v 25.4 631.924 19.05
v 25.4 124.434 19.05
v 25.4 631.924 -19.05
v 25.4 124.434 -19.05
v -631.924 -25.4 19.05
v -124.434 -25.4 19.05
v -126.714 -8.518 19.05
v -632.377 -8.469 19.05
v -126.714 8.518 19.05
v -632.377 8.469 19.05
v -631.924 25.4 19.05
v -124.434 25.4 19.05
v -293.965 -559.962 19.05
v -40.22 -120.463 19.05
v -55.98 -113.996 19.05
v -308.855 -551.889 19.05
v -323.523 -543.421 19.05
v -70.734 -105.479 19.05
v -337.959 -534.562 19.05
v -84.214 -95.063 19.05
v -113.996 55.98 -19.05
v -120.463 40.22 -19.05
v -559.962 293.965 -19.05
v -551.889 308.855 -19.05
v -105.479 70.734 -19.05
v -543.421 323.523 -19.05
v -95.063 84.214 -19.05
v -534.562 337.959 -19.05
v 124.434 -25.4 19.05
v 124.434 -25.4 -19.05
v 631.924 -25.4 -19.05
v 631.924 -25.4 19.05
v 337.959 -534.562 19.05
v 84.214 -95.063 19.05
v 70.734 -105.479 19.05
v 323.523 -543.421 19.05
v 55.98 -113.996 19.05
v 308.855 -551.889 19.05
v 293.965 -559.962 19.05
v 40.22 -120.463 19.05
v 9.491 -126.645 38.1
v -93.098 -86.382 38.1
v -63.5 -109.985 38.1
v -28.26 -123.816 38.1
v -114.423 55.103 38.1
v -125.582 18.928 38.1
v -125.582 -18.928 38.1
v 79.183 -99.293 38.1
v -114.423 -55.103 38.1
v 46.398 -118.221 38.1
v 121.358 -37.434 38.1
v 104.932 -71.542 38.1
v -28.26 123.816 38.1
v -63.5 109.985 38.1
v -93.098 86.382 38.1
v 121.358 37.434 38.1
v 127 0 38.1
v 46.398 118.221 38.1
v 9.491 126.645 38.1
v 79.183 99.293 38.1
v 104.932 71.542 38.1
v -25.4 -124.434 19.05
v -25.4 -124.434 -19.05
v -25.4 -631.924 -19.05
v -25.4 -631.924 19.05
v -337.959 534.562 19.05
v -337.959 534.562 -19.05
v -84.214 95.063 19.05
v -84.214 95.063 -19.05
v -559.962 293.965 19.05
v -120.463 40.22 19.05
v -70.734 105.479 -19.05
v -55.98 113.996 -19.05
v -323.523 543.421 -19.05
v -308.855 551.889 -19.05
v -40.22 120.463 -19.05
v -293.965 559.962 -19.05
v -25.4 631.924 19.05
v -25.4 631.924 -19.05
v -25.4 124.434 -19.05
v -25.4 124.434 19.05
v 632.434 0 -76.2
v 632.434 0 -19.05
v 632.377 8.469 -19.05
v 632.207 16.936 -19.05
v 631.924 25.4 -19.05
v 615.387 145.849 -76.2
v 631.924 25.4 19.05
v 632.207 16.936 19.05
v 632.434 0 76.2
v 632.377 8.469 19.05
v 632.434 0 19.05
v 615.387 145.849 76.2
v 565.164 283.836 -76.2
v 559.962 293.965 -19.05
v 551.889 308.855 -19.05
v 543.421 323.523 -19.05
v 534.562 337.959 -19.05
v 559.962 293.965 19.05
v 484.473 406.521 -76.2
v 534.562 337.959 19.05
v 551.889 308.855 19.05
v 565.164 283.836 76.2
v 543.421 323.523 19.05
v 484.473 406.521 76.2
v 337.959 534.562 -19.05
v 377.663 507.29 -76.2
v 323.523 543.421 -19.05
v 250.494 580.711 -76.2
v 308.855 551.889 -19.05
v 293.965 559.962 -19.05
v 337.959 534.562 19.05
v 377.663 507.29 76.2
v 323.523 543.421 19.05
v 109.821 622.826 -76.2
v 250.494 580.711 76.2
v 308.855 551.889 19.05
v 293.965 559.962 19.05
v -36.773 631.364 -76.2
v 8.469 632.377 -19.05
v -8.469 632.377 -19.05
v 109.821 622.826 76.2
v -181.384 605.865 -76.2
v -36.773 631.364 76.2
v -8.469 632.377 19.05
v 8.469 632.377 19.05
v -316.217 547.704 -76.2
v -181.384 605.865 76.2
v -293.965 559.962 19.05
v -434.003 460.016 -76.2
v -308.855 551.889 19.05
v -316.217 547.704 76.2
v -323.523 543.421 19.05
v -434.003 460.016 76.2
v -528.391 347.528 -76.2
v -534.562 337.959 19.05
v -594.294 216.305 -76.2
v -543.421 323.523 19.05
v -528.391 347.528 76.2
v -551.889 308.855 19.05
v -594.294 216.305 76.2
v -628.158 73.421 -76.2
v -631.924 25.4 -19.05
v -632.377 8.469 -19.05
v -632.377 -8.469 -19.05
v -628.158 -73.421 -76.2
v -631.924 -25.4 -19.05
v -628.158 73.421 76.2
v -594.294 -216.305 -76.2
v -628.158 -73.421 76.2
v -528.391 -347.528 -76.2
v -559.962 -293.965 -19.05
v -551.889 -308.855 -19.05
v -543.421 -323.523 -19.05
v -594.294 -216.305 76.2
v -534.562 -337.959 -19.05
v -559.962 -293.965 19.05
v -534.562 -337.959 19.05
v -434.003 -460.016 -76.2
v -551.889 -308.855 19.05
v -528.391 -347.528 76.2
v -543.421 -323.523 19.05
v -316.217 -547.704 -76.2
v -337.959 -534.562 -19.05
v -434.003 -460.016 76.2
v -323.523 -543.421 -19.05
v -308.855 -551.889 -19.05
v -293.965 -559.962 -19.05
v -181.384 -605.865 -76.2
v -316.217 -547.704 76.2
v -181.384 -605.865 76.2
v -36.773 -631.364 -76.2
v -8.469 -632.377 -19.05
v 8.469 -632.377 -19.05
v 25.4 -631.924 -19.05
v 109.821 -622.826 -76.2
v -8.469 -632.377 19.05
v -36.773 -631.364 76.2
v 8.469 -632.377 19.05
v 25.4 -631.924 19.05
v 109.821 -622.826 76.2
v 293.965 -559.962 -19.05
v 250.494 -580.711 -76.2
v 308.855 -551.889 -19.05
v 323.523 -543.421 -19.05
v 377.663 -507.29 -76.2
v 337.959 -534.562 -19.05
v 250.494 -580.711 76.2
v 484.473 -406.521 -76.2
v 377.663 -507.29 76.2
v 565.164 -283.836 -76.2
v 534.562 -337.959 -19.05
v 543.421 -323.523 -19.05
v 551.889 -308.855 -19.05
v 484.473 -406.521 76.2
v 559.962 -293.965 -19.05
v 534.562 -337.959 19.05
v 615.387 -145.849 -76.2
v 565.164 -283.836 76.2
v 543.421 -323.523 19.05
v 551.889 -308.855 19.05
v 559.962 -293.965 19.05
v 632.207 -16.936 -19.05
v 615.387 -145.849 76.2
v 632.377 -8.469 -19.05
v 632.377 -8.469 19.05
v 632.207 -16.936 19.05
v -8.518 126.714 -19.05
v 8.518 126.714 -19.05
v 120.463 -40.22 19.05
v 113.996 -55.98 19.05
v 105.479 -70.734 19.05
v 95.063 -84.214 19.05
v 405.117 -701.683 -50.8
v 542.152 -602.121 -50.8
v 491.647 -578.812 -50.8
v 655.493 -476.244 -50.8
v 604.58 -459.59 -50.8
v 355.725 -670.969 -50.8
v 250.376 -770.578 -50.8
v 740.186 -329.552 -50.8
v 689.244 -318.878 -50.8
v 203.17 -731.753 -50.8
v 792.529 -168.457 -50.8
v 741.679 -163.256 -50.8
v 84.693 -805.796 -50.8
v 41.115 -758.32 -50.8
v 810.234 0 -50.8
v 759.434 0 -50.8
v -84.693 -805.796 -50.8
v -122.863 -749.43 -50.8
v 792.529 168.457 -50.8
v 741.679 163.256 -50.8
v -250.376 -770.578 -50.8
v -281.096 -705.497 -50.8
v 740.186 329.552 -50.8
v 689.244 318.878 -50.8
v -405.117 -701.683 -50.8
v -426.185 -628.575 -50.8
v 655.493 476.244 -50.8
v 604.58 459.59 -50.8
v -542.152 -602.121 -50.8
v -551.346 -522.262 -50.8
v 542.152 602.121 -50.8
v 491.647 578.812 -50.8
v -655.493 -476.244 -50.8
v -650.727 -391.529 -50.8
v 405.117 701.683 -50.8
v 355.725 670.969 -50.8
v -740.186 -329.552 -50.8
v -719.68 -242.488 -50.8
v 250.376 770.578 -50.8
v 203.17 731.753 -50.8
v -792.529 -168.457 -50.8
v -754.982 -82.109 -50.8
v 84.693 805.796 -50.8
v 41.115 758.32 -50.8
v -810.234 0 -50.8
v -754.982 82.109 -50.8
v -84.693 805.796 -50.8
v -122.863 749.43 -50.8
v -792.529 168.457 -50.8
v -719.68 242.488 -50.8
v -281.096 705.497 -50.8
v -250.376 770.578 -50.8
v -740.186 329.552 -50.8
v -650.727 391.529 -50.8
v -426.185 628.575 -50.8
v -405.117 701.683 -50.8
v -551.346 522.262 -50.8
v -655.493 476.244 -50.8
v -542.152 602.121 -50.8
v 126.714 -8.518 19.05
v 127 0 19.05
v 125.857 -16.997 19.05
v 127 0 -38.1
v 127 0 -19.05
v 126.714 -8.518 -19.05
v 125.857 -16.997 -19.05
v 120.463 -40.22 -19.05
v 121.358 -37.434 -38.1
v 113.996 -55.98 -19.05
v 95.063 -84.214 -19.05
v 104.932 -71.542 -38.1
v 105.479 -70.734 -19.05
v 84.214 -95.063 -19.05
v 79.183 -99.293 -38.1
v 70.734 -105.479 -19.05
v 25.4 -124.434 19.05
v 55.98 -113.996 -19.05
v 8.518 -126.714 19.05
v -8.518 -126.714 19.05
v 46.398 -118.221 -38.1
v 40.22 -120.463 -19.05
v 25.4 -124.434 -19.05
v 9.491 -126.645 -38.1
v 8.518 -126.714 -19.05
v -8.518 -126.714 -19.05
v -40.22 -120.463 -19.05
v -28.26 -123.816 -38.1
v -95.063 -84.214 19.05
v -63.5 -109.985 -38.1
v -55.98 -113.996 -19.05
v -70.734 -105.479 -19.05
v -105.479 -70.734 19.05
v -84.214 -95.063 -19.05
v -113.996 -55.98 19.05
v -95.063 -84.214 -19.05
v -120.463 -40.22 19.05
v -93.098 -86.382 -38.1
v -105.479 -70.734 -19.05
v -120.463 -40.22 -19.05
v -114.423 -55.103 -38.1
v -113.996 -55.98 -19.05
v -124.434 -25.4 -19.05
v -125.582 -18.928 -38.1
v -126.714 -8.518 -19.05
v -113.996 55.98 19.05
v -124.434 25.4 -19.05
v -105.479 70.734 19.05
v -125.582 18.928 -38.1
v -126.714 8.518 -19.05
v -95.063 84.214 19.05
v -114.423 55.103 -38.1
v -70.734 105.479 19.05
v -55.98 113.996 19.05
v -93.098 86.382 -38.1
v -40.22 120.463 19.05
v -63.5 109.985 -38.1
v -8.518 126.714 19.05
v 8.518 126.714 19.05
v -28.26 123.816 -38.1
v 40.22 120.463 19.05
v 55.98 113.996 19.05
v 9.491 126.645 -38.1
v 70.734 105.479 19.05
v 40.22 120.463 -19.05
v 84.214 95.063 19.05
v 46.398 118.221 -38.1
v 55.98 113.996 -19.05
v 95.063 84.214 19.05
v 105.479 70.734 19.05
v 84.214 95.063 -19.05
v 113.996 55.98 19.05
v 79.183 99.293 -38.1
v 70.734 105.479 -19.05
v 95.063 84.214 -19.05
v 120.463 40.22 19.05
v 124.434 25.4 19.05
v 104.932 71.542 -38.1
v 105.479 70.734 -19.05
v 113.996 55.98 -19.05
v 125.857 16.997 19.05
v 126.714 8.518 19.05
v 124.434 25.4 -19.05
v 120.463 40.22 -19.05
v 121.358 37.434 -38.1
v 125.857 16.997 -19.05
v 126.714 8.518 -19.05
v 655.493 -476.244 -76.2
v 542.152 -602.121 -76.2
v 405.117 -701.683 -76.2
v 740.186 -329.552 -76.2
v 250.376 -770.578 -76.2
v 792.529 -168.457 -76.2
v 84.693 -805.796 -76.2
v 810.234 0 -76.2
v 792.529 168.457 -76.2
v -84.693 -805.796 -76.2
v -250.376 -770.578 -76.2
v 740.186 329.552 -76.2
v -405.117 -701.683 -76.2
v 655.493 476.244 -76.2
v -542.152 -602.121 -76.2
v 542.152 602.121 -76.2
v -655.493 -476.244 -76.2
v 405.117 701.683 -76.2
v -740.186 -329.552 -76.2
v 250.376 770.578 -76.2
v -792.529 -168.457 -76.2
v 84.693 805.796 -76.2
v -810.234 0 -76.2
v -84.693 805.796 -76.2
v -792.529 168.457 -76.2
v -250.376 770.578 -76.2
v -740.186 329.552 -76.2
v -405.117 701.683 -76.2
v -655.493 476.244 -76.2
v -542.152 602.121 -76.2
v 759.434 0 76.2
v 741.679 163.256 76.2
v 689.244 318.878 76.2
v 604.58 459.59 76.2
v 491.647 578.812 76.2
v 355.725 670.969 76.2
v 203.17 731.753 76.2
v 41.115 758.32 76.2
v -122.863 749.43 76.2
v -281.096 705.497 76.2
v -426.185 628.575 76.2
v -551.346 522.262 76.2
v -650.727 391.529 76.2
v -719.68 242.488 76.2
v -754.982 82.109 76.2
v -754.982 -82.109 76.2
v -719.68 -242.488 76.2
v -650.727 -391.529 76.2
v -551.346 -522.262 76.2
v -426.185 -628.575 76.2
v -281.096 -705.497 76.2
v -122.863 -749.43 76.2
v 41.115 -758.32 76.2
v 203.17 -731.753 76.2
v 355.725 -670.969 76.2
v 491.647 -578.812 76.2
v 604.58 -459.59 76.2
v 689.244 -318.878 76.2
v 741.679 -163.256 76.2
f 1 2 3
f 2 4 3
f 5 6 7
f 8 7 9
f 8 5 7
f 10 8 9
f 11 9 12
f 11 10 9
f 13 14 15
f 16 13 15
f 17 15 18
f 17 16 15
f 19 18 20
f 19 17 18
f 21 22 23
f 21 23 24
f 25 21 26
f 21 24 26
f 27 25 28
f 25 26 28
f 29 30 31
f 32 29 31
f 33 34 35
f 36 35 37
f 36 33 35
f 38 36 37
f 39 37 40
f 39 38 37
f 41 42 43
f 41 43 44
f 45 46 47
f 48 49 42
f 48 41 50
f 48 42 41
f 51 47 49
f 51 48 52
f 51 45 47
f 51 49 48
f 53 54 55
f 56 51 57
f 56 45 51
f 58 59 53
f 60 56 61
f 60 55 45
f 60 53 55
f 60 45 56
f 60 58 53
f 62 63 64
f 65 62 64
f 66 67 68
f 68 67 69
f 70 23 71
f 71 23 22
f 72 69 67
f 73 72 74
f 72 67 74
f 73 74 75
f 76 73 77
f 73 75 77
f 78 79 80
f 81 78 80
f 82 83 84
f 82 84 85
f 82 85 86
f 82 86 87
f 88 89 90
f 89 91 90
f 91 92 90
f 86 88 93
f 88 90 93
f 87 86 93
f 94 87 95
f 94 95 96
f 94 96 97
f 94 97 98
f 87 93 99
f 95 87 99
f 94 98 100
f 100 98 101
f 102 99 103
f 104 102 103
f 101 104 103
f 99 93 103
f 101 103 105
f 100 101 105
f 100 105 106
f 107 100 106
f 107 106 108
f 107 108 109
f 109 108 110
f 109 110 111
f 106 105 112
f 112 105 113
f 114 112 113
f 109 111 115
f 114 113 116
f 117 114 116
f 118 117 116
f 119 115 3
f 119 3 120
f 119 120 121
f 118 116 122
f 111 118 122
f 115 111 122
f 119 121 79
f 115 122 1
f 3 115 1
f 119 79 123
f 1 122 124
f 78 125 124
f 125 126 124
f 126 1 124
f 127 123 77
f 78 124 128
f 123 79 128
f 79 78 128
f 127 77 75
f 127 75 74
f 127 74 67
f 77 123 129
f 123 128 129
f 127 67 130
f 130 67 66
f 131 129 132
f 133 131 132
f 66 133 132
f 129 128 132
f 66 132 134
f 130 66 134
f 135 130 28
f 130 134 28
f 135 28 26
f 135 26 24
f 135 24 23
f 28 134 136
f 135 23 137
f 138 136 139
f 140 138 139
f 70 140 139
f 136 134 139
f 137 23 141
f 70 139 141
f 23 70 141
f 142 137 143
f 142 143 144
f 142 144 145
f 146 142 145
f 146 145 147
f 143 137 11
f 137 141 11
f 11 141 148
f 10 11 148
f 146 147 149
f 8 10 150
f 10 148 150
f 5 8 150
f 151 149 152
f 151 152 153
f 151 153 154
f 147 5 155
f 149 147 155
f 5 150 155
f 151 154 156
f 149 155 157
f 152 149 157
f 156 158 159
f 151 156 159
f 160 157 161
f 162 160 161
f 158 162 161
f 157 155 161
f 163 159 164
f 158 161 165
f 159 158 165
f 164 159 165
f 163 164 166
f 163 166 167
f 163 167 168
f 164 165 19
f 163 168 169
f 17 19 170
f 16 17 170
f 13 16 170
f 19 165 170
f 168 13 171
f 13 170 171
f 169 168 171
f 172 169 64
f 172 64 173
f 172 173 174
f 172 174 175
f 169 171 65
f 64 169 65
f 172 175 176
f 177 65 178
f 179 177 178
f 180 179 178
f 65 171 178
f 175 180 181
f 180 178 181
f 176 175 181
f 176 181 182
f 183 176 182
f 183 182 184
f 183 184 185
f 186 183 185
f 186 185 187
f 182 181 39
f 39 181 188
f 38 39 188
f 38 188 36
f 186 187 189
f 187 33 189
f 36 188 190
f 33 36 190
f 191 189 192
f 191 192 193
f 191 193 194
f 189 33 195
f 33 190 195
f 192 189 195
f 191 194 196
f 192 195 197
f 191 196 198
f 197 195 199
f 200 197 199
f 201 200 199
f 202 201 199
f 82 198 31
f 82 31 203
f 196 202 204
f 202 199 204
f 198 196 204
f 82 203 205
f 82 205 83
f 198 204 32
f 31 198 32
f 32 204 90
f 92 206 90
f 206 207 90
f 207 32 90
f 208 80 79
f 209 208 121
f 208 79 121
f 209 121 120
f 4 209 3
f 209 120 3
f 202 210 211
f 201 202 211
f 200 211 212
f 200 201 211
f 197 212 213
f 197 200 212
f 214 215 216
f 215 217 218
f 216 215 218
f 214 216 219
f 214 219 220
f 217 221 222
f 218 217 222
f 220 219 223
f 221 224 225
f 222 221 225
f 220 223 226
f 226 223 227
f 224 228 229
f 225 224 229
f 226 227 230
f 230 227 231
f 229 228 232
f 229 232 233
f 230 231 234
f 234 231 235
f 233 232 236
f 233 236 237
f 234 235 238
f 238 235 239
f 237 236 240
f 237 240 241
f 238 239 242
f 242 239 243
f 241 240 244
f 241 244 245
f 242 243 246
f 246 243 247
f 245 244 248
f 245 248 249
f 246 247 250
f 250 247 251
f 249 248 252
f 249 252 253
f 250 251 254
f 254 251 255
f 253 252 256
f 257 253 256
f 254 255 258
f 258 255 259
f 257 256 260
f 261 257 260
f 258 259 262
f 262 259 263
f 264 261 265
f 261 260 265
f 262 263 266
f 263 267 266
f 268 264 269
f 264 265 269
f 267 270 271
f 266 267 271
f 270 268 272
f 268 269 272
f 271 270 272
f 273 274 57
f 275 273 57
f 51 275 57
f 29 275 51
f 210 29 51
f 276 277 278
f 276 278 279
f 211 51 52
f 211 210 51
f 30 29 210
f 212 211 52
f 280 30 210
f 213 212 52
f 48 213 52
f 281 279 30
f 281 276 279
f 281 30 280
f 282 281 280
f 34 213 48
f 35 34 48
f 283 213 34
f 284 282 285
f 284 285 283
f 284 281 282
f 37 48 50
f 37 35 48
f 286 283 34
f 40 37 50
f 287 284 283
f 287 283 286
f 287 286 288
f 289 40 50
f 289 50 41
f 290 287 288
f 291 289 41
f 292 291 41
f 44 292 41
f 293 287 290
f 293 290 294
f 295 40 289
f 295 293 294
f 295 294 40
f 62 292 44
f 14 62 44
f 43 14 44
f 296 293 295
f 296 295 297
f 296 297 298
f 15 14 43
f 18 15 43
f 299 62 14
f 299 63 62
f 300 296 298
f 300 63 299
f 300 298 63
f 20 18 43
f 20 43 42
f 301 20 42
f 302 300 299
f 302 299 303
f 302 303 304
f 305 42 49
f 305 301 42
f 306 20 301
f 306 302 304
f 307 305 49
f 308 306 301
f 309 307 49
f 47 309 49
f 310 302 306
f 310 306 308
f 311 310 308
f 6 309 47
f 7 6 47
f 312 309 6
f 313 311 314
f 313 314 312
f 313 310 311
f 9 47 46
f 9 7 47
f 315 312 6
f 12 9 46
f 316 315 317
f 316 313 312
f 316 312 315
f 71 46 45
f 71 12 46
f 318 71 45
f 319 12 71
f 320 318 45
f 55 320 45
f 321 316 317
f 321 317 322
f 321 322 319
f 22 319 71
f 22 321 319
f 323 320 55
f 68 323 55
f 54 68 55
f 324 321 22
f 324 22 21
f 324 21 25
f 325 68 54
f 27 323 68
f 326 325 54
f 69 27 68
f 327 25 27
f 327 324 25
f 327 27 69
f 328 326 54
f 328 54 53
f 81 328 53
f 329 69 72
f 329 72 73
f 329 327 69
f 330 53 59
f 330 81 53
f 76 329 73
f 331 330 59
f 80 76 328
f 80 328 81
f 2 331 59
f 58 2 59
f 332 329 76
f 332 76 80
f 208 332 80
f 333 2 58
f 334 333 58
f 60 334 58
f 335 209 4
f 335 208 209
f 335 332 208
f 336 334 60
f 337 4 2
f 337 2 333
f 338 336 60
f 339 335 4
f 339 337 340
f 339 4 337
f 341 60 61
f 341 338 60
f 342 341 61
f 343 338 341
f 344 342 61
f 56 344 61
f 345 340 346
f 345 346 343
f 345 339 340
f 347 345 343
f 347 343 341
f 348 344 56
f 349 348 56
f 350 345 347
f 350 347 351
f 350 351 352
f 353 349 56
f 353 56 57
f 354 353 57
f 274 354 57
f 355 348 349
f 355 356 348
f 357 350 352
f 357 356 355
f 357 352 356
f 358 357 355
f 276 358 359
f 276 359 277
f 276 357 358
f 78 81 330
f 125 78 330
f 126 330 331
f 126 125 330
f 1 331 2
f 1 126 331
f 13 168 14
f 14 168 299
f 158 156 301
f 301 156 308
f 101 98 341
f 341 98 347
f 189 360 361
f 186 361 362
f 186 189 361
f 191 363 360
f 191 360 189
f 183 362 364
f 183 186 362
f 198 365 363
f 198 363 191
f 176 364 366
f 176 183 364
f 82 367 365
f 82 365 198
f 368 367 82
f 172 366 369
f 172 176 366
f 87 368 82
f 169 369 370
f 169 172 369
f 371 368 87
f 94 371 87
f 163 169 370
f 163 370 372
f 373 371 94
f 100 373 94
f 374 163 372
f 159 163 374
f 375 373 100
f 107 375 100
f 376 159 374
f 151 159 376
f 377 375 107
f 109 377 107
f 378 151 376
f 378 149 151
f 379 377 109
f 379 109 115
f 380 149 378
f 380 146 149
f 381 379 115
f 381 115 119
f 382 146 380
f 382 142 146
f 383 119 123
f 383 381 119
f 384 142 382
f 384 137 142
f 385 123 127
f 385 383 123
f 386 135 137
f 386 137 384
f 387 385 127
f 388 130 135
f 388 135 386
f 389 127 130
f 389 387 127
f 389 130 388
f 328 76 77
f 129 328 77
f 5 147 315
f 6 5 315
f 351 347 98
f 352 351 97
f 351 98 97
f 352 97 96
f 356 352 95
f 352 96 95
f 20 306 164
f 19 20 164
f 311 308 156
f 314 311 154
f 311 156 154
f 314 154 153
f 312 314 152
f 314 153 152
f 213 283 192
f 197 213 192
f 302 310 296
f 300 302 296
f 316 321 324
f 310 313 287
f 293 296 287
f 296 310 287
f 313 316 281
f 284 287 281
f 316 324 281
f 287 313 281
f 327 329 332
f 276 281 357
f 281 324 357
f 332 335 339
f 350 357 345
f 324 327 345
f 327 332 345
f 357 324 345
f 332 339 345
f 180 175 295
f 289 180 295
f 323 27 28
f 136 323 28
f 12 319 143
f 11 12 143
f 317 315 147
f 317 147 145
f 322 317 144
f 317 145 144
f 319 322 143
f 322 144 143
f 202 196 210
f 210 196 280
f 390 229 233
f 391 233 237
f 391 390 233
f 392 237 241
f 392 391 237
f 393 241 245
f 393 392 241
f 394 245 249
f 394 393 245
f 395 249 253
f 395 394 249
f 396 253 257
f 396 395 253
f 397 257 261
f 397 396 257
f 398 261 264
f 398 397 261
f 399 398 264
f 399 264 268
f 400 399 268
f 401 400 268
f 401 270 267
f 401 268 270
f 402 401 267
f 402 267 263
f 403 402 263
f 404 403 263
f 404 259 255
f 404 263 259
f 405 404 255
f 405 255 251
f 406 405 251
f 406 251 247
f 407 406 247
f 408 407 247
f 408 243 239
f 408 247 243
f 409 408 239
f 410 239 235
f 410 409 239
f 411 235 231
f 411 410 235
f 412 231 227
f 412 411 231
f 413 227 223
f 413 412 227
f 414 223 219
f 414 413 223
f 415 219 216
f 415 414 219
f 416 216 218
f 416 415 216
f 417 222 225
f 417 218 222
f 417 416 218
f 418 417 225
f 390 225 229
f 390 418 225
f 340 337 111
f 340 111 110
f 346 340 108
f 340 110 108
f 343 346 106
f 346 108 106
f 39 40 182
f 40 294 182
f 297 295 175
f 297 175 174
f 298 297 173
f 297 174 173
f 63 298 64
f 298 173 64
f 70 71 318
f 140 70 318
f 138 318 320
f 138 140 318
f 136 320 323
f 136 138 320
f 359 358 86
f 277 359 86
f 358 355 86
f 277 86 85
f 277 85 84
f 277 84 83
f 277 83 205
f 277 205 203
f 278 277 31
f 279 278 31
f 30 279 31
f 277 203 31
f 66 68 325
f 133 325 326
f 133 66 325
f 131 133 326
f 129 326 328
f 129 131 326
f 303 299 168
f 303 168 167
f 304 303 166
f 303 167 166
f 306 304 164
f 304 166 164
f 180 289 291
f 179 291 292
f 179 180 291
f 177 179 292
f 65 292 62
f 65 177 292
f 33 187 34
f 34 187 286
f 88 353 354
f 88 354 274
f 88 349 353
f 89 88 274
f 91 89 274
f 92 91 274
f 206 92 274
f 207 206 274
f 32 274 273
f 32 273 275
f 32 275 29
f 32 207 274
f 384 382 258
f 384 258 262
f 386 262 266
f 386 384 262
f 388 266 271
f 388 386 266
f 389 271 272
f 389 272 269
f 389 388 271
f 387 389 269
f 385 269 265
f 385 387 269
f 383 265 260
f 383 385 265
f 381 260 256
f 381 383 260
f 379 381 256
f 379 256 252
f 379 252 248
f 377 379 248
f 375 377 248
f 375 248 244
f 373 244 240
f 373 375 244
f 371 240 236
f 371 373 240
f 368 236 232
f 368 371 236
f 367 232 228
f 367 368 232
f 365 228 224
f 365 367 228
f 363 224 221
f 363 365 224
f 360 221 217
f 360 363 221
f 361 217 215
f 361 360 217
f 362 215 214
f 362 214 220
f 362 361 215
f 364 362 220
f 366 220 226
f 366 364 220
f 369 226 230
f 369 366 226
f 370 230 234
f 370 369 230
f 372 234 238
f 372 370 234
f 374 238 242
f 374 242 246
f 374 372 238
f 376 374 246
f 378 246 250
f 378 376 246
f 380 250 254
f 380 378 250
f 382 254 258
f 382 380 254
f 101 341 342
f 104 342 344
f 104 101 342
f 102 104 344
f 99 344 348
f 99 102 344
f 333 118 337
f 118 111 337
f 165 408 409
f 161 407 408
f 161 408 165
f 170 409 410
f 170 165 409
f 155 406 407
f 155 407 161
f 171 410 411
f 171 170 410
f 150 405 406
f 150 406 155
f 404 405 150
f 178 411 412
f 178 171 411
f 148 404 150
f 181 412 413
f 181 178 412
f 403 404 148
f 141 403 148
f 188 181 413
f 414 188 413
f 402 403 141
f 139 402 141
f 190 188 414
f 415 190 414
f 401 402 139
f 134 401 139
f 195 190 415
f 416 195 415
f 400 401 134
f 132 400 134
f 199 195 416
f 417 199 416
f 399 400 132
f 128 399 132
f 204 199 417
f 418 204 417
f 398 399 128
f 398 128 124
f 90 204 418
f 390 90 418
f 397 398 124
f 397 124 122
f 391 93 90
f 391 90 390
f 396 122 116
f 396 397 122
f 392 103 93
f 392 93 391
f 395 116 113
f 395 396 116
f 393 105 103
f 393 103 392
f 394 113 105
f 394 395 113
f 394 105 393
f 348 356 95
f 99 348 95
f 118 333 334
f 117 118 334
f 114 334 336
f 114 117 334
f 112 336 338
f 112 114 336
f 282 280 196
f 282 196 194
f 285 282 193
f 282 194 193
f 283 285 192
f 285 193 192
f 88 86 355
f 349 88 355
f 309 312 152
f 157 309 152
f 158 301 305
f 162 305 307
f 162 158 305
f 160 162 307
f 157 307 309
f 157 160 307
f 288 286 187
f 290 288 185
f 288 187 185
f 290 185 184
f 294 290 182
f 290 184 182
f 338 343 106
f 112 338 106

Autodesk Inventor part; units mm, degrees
ref_plane "YZ Plane" through (0, 0, 0) normal (1, 0, 0) x (0, 1, 0)
ref_plane "XZ Plane" through (0, 0, 0) normal (0, 1, 0) x (-1, 0, 0)
ref_plane "XY Plane" through (0, 0, 0) normal (0, 0, 1) x (1, 0, 0)
sketch "Sketch1" plane through (0, 0, 0) normal (0, 0, 1) x (1, 0, 0)
  circle A0 centre (0, 0) radius 127
  dimension "d0" = 254
extrude "Extrusion1" add sketch "Sketch1" along normal mid plane 76.2
sketch "Sketch2" plane through (0, 0, 0) normal (0, 0, 1) x (1, 0, 0)
  circle A0 centre (0, 0) radius 127 construction
  line L0 (-25.4, 124.4341) -> (25.4, 124.4341)
  line L1 (25.4, 124.4341) -> (25.4, 632.4341)
  line L2 (25.4, 632.4341) -> (-25.4, 632.4341)
  line L3 (-25.4, 632.4341) -> (-25.4, 124.4341)
  dimension "d3" = 50.8
  dimension "d4" = 508
extrude "Extrusion2" add sketch "Sketch2" along normal mid plane 38.1
pattern_circular "Circular Pattern1" count 12 over 360 about axis through (0, 0, -10) along (0, 0, 1) of "Extrusion2"
sketch "Sketch3" plane through (0, 0, 0) normal (0, 0, 1) x (1, 0, 0)
  circle A0 centre (0, 0) radius 632.4341
  line L0 (25.4, 632.4341) -> (-25.4, 632.4341) projected
  arc A1 (-95.0631, 84.2141) -> (-120.4631, 40.22) centre (0, 0) ccw projected
  circle A2 centre (0, 0) radius 759.4341
  point P0 (0, 632.4341)
  dimension "d10" = 127
extrude "Extrusion3" add sketch "Sketch3" along normal mid plane 152.4
sketch "Sketch5" plane through (0, 0, -76.2) normal (0, 0, -1) x (-1, 0, 0)
  circle A0 centre (0, 0) radius 810.2341
  circle A1 centre (0, 0) radius 759.4341 projected
  circle A2 centre (0, 0) radius 759.4341
  dimension "d13" = 50.8
extrude "Extrusion4" add sketch "Sketch5" against normal blind 25.4
properties part number "wheel"
